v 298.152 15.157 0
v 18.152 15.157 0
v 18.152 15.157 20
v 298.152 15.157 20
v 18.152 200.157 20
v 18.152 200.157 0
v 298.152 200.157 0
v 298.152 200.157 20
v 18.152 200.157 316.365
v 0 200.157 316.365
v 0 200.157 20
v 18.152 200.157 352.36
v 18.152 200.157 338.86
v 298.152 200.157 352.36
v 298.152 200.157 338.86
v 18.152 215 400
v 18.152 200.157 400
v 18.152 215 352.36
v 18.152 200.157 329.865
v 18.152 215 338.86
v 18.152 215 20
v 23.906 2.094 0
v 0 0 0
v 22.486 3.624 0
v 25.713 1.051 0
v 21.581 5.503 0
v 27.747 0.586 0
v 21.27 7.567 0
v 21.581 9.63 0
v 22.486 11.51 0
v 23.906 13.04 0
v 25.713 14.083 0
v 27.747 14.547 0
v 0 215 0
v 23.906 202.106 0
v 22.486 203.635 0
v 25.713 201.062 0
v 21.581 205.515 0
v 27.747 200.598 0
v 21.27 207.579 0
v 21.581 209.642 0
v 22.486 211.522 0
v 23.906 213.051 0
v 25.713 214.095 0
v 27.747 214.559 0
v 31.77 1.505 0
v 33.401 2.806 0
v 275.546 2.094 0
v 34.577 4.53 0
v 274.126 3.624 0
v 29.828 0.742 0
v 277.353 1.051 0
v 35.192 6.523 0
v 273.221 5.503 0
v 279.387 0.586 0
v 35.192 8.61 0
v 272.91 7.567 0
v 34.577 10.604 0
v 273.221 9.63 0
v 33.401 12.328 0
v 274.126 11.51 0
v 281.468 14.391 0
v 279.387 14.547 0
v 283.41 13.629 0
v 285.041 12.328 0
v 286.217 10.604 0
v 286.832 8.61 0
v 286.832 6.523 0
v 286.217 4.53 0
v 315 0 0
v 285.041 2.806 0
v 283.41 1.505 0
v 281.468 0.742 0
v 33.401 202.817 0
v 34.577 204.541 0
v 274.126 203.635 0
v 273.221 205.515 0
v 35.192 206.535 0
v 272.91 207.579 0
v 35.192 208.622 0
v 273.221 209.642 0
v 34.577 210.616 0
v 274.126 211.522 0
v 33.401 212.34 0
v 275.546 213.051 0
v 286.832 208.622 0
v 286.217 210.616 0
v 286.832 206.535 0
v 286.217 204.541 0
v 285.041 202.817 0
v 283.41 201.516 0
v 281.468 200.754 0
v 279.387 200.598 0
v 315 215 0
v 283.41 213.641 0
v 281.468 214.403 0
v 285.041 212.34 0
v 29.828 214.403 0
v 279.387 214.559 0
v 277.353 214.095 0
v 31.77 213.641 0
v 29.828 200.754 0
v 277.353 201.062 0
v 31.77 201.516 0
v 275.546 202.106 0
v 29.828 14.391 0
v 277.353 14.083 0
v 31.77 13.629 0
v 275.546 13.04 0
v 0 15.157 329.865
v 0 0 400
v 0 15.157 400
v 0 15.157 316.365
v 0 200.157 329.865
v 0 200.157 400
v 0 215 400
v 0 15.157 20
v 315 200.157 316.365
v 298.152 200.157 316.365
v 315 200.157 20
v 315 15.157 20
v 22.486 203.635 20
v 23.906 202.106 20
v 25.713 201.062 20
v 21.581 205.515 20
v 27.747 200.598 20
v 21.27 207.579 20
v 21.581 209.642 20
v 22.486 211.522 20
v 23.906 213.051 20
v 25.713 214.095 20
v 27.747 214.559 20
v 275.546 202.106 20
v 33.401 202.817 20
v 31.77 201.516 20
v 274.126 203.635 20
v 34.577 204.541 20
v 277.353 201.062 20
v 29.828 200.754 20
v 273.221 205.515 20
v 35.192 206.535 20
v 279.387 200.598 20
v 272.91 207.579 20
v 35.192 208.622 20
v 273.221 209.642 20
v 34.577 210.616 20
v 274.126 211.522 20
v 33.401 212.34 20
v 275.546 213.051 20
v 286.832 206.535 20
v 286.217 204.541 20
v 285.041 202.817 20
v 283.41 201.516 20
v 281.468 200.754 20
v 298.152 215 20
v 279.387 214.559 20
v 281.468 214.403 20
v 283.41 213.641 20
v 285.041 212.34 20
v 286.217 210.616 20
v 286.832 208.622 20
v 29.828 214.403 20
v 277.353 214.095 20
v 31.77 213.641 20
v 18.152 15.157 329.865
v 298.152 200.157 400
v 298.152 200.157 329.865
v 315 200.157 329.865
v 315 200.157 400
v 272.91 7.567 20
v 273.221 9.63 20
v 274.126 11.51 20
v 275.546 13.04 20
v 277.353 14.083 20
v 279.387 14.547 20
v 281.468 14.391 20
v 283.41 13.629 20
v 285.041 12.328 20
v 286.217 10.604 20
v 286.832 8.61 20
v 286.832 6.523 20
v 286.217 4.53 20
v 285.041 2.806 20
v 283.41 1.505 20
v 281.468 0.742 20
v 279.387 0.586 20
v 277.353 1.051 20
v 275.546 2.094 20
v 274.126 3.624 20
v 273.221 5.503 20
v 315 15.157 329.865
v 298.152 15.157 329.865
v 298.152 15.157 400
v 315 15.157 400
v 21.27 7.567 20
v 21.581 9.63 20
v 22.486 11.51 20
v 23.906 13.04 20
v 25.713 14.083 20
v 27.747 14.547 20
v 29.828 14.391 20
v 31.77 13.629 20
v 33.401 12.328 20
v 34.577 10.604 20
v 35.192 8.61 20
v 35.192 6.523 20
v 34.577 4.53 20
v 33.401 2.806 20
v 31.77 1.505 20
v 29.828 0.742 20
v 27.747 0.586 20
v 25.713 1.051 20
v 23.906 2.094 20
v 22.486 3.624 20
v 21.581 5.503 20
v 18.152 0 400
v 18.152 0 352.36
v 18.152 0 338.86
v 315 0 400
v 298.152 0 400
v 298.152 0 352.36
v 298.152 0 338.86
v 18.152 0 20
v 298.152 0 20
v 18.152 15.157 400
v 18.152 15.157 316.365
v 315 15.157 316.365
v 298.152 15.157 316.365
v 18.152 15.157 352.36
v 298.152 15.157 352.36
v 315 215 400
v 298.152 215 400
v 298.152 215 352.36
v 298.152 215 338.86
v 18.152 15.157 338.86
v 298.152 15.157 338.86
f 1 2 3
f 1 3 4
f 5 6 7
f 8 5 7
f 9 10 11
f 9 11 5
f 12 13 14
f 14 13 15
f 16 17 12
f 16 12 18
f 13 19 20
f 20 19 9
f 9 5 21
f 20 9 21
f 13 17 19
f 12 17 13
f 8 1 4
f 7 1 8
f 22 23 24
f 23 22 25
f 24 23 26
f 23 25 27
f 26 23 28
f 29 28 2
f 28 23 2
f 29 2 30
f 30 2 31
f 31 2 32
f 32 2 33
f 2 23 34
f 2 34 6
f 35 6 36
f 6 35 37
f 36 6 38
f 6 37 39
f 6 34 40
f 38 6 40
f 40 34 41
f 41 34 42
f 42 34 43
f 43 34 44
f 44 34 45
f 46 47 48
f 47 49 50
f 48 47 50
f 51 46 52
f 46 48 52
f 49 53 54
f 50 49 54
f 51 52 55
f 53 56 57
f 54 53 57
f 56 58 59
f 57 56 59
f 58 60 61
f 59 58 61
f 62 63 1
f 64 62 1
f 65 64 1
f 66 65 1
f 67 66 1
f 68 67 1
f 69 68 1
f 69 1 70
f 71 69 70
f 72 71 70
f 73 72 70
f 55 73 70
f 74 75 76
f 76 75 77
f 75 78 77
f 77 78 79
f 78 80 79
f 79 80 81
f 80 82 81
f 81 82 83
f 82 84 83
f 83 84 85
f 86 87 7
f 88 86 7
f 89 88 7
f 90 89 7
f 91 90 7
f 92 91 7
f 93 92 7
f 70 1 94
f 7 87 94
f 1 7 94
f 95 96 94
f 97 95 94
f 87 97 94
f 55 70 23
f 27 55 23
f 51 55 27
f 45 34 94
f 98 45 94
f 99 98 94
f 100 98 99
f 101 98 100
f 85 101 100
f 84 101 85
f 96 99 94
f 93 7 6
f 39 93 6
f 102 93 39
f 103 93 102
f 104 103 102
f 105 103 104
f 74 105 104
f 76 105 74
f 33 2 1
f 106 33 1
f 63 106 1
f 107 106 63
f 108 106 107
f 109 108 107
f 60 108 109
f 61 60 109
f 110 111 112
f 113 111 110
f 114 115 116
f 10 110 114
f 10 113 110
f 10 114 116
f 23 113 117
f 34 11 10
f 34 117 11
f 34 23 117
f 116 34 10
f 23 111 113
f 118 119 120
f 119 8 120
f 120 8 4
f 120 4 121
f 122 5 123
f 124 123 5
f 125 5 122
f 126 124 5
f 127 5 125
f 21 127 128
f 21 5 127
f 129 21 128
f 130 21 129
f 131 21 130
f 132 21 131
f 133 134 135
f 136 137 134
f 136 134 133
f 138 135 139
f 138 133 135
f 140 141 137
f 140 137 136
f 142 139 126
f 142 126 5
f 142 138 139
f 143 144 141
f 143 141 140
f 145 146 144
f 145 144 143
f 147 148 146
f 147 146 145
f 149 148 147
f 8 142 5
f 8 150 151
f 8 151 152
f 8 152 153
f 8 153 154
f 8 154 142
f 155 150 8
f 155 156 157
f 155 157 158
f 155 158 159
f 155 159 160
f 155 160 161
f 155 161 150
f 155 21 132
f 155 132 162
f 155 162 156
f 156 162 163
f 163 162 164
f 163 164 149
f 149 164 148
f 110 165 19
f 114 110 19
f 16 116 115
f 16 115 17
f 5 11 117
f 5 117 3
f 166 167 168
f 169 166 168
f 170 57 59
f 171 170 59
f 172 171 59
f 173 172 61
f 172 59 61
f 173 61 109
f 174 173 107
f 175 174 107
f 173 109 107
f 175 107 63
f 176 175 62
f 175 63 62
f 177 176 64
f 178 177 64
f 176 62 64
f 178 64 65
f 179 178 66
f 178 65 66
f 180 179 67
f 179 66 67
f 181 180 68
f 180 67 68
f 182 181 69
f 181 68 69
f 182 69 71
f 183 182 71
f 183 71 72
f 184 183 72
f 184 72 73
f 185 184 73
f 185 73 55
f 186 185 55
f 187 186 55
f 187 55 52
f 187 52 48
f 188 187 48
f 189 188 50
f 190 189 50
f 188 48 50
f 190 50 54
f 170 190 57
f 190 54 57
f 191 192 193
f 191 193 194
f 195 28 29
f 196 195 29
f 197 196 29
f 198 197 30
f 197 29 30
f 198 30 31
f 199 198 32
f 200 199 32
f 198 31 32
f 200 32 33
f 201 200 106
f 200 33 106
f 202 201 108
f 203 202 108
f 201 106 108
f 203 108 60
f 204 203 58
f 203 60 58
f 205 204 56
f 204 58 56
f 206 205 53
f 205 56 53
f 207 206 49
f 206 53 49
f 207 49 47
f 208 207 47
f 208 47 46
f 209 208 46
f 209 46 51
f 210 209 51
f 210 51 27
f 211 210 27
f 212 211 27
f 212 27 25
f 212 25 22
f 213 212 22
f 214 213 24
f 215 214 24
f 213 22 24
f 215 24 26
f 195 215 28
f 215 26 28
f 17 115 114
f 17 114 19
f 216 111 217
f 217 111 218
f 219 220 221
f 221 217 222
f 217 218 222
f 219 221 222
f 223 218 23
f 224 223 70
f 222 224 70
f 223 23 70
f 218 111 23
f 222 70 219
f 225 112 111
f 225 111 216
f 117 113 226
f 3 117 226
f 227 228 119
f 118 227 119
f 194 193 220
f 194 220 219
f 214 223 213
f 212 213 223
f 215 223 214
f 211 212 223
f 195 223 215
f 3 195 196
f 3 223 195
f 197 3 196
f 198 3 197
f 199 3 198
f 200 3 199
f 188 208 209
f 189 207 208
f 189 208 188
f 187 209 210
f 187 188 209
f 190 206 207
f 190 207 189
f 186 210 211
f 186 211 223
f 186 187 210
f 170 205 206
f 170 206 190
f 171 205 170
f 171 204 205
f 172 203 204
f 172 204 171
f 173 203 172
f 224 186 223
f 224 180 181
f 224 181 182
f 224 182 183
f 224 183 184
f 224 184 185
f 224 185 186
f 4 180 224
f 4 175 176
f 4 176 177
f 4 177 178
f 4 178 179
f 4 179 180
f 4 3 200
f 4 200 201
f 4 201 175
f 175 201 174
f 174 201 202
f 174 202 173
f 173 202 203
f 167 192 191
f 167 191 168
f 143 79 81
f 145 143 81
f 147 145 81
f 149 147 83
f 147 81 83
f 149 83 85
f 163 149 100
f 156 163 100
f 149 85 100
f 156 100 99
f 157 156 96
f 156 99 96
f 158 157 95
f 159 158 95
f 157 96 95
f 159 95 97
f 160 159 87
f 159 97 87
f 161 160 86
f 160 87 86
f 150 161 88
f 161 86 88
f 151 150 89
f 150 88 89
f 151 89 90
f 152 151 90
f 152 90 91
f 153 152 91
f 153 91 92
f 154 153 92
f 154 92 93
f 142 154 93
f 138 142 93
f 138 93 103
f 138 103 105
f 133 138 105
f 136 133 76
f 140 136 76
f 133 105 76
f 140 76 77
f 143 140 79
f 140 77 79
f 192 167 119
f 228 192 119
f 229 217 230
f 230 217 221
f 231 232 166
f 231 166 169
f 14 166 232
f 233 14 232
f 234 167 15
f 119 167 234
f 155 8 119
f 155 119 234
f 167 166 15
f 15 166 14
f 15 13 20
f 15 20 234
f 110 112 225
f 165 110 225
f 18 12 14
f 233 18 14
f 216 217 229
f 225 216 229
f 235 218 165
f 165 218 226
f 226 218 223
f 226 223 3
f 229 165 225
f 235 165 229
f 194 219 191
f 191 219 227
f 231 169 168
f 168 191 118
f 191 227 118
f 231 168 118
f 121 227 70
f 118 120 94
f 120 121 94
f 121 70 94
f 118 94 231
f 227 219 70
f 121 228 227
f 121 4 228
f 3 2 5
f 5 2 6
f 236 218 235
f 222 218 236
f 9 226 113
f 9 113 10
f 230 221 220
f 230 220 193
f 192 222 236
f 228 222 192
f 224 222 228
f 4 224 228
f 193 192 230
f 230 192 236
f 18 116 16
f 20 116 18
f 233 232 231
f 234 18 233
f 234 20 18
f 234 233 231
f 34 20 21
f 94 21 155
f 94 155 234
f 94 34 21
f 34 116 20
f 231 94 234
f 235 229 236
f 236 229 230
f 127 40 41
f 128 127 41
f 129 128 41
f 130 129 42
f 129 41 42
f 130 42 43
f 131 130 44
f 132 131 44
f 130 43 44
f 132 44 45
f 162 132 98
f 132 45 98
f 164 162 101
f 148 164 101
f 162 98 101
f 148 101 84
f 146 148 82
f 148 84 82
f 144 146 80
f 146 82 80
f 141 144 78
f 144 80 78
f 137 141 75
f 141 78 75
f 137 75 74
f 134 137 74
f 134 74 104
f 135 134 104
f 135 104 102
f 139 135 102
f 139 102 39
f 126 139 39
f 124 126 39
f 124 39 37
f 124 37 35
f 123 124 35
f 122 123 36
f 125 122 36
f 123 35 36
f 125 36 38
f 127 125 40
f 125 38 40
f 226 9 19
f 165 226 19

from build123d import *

# Parameters (mm, degrees)
SKETCH_13_W         = 280
SKETCH_13_H         = 14.842907488
EXTRUDE_14_DEPTH    = 20
SKETCH_13_W_2       = 18.151554109
SKETCH_13_H_2       = 185
EXTRUDE_14_2_DEPTH  = 20
SKETCH_13_H_3       = 15.157092512
EXTRUDE_14_3_DEPTH  = 20
SKETCH_13_W_3       = 16.848445891
EXTRUDE_14_4_DEPTH  = 20
SKETCH_29_W         = 18.151554109
SKETCH_29_H         = 14.842907488
SKETCH_29_W_2       = 16.848445891
SKETCH_29_H_2       = 15.157092512
EXTRUDE_15_DEPTH    = 400
EXTRUDE_START       = -16.848446
SKETCH_33_W         = 13.5
SKETCH_33_H         = 185
EXTRUDE_16_DEPTH    = 16.848446
EXTRUDE_START_2     = -18.151554
SKETCH_32_W         = 13.5
SKETCH_32_H         = 185
EXTRUDE_17_DEPTH    = 18.151554
EXTRUDE_START_3     = -14.842907
SKETCH_31_W         = 280
SKETCH_31_H         = 13.5
EXTRUDE_18_DEPTH    = 14.842907
SKETCH_30_W         = 280
SKETCH_30_H         = 13.5
EXTRUDE_19_DEPTH    = 15.15709
SKETCH_34_R         = 7
CUT_EXTRUDE_1_DEPTH = 20


with BuildPart() as part:
    # 草图13 → 凸台-拉伸14 (new body)
    with BuildSketch(Plane.XY):
        with Locations((158.151554109, 207.578546256)):
            Rectangle(SKETCH_13_W, SKETCH_13_H)
    extrude(amount=EXTRUDE_14_DEPTH)



with BuildPart() as body_2:
    # 草图13 → Extrude 14 2 (new body)
    with BuildSketch(Plane.XY):
        with Locations((9.075777055, 107.657092512)):
            Rectangle(SKETCH_13_W_2, SKETCH_13_H_2)
    extrude(amount=EXTRUDE_14_2_DEPTH)


with BuildPart() as body_3:
    # 草图13 → Extrude 14 3 (new body)
    with BuildSketch(Plane.XY):
        with Locations((158.151554109, 7.578546256)):
            Rectangle(SKETCH_13_W, SKETCH_13_H_3)
    extrude(amount=EXTRUDE_14_3_DEPTH)


with BuildPart() as body_4:
    # 草图13 → Extrude 14 4 (new body)
    with BuildSketch(Plane.XY):
        with Locations((306.575777055, 107.657092512)):
            Rectangle(SKETCH_13_W_3, SKETCH_13_H_2)
    extrude(amount=EXTRUDE_14_4_DEPTH)


with BuildPart() as part_1:
    add(part.part)

    add(body_2.part)  # 凸台-拉伸15 merges body 2

    add(body_3.part)  # 凸台-拉伸15 merges body 3

    add(body_4.part)  # 凸台-拉伸15 merges body 4
    # 草图29 → 凸台-拉伸15 (add)
    with BuildSketch(Plane.XY):
        with Locations((9.075777055, 207.578546256)):
            Rectangle(SKETCH_29_W, SKETCH_29_H)
        with Locations((306.575777055, 207.578546256)):
            Rectangle(SKETCH_29_W_2, SKETCH_29_H)
        with Locations((9.075777055, 7.578546256)):
            Rectangle(SKETCH_29_W, SKETCH_29_H_2)
        with Locations((306.575777055, 7.578546256)):
            Rectangle(SKETCH_29_W_2, SKETCH_29_H_2)
    extrude(amount=EXTRUDE_15_DEPTH)

    # 草图33 → 凸台-拉伸16 (add)
    with BuildSketch(Plane(origin=(315, 0, 0), x_dir=(0, 0, -1), z_dir=(1, 0, 0)).offset(EXTRUDE_START)):
        with Locations((-323.114974864, 107.657092512)):
            Rectangle(SKETCH_33_W, SKETCH_33_H)
    extrude(amount=EXTRUDE_16_DEPTH)

    # 草图32 → 凸台-拉伸17 (add)
    with BuildSketch(Plane.ZY.offset(EXTRUDE_START_2)):
        with Locations((323.114974864, 107.657092512)):
            Rectangle(SKETCH_32_W, SKETCH_32_H)
    extrude(amount=EXTRUDE_17_DEPTH)

    # 草图31 → 凸台-拉伸18 (add)
    with BuildSketch(Plane(origin=(0, 215, 0), x_dir=(1, 0, 0), z_dir=(0, 1, 0)).offset(EXTRUDE_START_3)):
        with Locations((158.151554109, -345.610164736)):
            Rectangle(SKETCH_31_W, SKETCH_31_H)
    extrude(amount=EXTRUDE_18_DEPTH)

    # 草图30 → 凸台-拉伸19 (add)
    with BuildSketch(Plane.XZ):
        with Locations((158.151554109, 345.610164736)):
            Rectangle(SKETCH_30_W, SKETCH_30_H)
    extrude(amount=-EXTRUDE_19_DEPTH)

    # 草图34 → 切除-拉伸1 (cut)
    with BuildSketch(Plane(origin=(0, 0, 0), x_dir=(-1, 0, 0), z_dir=(0, 0, -1))):
        with Locations((-279.91, 207.578546256)):
            Circle(SKETCH_34_R)
        with Locations((-279.91, 7.566753944)):
            Circle(SKETCH_34_R)
        with Locations((-28.27, 207.578546256)):
            Circle(SKETCH_34_R)
        with Locations((-28.27, 7.566753944)):
            Circle(SKETCH_34_R)
    extrude(amount=-CUT_EXTRUDE_1_DEPTH, mode=Mode.SUBTRACT)


solid = part_1.part
